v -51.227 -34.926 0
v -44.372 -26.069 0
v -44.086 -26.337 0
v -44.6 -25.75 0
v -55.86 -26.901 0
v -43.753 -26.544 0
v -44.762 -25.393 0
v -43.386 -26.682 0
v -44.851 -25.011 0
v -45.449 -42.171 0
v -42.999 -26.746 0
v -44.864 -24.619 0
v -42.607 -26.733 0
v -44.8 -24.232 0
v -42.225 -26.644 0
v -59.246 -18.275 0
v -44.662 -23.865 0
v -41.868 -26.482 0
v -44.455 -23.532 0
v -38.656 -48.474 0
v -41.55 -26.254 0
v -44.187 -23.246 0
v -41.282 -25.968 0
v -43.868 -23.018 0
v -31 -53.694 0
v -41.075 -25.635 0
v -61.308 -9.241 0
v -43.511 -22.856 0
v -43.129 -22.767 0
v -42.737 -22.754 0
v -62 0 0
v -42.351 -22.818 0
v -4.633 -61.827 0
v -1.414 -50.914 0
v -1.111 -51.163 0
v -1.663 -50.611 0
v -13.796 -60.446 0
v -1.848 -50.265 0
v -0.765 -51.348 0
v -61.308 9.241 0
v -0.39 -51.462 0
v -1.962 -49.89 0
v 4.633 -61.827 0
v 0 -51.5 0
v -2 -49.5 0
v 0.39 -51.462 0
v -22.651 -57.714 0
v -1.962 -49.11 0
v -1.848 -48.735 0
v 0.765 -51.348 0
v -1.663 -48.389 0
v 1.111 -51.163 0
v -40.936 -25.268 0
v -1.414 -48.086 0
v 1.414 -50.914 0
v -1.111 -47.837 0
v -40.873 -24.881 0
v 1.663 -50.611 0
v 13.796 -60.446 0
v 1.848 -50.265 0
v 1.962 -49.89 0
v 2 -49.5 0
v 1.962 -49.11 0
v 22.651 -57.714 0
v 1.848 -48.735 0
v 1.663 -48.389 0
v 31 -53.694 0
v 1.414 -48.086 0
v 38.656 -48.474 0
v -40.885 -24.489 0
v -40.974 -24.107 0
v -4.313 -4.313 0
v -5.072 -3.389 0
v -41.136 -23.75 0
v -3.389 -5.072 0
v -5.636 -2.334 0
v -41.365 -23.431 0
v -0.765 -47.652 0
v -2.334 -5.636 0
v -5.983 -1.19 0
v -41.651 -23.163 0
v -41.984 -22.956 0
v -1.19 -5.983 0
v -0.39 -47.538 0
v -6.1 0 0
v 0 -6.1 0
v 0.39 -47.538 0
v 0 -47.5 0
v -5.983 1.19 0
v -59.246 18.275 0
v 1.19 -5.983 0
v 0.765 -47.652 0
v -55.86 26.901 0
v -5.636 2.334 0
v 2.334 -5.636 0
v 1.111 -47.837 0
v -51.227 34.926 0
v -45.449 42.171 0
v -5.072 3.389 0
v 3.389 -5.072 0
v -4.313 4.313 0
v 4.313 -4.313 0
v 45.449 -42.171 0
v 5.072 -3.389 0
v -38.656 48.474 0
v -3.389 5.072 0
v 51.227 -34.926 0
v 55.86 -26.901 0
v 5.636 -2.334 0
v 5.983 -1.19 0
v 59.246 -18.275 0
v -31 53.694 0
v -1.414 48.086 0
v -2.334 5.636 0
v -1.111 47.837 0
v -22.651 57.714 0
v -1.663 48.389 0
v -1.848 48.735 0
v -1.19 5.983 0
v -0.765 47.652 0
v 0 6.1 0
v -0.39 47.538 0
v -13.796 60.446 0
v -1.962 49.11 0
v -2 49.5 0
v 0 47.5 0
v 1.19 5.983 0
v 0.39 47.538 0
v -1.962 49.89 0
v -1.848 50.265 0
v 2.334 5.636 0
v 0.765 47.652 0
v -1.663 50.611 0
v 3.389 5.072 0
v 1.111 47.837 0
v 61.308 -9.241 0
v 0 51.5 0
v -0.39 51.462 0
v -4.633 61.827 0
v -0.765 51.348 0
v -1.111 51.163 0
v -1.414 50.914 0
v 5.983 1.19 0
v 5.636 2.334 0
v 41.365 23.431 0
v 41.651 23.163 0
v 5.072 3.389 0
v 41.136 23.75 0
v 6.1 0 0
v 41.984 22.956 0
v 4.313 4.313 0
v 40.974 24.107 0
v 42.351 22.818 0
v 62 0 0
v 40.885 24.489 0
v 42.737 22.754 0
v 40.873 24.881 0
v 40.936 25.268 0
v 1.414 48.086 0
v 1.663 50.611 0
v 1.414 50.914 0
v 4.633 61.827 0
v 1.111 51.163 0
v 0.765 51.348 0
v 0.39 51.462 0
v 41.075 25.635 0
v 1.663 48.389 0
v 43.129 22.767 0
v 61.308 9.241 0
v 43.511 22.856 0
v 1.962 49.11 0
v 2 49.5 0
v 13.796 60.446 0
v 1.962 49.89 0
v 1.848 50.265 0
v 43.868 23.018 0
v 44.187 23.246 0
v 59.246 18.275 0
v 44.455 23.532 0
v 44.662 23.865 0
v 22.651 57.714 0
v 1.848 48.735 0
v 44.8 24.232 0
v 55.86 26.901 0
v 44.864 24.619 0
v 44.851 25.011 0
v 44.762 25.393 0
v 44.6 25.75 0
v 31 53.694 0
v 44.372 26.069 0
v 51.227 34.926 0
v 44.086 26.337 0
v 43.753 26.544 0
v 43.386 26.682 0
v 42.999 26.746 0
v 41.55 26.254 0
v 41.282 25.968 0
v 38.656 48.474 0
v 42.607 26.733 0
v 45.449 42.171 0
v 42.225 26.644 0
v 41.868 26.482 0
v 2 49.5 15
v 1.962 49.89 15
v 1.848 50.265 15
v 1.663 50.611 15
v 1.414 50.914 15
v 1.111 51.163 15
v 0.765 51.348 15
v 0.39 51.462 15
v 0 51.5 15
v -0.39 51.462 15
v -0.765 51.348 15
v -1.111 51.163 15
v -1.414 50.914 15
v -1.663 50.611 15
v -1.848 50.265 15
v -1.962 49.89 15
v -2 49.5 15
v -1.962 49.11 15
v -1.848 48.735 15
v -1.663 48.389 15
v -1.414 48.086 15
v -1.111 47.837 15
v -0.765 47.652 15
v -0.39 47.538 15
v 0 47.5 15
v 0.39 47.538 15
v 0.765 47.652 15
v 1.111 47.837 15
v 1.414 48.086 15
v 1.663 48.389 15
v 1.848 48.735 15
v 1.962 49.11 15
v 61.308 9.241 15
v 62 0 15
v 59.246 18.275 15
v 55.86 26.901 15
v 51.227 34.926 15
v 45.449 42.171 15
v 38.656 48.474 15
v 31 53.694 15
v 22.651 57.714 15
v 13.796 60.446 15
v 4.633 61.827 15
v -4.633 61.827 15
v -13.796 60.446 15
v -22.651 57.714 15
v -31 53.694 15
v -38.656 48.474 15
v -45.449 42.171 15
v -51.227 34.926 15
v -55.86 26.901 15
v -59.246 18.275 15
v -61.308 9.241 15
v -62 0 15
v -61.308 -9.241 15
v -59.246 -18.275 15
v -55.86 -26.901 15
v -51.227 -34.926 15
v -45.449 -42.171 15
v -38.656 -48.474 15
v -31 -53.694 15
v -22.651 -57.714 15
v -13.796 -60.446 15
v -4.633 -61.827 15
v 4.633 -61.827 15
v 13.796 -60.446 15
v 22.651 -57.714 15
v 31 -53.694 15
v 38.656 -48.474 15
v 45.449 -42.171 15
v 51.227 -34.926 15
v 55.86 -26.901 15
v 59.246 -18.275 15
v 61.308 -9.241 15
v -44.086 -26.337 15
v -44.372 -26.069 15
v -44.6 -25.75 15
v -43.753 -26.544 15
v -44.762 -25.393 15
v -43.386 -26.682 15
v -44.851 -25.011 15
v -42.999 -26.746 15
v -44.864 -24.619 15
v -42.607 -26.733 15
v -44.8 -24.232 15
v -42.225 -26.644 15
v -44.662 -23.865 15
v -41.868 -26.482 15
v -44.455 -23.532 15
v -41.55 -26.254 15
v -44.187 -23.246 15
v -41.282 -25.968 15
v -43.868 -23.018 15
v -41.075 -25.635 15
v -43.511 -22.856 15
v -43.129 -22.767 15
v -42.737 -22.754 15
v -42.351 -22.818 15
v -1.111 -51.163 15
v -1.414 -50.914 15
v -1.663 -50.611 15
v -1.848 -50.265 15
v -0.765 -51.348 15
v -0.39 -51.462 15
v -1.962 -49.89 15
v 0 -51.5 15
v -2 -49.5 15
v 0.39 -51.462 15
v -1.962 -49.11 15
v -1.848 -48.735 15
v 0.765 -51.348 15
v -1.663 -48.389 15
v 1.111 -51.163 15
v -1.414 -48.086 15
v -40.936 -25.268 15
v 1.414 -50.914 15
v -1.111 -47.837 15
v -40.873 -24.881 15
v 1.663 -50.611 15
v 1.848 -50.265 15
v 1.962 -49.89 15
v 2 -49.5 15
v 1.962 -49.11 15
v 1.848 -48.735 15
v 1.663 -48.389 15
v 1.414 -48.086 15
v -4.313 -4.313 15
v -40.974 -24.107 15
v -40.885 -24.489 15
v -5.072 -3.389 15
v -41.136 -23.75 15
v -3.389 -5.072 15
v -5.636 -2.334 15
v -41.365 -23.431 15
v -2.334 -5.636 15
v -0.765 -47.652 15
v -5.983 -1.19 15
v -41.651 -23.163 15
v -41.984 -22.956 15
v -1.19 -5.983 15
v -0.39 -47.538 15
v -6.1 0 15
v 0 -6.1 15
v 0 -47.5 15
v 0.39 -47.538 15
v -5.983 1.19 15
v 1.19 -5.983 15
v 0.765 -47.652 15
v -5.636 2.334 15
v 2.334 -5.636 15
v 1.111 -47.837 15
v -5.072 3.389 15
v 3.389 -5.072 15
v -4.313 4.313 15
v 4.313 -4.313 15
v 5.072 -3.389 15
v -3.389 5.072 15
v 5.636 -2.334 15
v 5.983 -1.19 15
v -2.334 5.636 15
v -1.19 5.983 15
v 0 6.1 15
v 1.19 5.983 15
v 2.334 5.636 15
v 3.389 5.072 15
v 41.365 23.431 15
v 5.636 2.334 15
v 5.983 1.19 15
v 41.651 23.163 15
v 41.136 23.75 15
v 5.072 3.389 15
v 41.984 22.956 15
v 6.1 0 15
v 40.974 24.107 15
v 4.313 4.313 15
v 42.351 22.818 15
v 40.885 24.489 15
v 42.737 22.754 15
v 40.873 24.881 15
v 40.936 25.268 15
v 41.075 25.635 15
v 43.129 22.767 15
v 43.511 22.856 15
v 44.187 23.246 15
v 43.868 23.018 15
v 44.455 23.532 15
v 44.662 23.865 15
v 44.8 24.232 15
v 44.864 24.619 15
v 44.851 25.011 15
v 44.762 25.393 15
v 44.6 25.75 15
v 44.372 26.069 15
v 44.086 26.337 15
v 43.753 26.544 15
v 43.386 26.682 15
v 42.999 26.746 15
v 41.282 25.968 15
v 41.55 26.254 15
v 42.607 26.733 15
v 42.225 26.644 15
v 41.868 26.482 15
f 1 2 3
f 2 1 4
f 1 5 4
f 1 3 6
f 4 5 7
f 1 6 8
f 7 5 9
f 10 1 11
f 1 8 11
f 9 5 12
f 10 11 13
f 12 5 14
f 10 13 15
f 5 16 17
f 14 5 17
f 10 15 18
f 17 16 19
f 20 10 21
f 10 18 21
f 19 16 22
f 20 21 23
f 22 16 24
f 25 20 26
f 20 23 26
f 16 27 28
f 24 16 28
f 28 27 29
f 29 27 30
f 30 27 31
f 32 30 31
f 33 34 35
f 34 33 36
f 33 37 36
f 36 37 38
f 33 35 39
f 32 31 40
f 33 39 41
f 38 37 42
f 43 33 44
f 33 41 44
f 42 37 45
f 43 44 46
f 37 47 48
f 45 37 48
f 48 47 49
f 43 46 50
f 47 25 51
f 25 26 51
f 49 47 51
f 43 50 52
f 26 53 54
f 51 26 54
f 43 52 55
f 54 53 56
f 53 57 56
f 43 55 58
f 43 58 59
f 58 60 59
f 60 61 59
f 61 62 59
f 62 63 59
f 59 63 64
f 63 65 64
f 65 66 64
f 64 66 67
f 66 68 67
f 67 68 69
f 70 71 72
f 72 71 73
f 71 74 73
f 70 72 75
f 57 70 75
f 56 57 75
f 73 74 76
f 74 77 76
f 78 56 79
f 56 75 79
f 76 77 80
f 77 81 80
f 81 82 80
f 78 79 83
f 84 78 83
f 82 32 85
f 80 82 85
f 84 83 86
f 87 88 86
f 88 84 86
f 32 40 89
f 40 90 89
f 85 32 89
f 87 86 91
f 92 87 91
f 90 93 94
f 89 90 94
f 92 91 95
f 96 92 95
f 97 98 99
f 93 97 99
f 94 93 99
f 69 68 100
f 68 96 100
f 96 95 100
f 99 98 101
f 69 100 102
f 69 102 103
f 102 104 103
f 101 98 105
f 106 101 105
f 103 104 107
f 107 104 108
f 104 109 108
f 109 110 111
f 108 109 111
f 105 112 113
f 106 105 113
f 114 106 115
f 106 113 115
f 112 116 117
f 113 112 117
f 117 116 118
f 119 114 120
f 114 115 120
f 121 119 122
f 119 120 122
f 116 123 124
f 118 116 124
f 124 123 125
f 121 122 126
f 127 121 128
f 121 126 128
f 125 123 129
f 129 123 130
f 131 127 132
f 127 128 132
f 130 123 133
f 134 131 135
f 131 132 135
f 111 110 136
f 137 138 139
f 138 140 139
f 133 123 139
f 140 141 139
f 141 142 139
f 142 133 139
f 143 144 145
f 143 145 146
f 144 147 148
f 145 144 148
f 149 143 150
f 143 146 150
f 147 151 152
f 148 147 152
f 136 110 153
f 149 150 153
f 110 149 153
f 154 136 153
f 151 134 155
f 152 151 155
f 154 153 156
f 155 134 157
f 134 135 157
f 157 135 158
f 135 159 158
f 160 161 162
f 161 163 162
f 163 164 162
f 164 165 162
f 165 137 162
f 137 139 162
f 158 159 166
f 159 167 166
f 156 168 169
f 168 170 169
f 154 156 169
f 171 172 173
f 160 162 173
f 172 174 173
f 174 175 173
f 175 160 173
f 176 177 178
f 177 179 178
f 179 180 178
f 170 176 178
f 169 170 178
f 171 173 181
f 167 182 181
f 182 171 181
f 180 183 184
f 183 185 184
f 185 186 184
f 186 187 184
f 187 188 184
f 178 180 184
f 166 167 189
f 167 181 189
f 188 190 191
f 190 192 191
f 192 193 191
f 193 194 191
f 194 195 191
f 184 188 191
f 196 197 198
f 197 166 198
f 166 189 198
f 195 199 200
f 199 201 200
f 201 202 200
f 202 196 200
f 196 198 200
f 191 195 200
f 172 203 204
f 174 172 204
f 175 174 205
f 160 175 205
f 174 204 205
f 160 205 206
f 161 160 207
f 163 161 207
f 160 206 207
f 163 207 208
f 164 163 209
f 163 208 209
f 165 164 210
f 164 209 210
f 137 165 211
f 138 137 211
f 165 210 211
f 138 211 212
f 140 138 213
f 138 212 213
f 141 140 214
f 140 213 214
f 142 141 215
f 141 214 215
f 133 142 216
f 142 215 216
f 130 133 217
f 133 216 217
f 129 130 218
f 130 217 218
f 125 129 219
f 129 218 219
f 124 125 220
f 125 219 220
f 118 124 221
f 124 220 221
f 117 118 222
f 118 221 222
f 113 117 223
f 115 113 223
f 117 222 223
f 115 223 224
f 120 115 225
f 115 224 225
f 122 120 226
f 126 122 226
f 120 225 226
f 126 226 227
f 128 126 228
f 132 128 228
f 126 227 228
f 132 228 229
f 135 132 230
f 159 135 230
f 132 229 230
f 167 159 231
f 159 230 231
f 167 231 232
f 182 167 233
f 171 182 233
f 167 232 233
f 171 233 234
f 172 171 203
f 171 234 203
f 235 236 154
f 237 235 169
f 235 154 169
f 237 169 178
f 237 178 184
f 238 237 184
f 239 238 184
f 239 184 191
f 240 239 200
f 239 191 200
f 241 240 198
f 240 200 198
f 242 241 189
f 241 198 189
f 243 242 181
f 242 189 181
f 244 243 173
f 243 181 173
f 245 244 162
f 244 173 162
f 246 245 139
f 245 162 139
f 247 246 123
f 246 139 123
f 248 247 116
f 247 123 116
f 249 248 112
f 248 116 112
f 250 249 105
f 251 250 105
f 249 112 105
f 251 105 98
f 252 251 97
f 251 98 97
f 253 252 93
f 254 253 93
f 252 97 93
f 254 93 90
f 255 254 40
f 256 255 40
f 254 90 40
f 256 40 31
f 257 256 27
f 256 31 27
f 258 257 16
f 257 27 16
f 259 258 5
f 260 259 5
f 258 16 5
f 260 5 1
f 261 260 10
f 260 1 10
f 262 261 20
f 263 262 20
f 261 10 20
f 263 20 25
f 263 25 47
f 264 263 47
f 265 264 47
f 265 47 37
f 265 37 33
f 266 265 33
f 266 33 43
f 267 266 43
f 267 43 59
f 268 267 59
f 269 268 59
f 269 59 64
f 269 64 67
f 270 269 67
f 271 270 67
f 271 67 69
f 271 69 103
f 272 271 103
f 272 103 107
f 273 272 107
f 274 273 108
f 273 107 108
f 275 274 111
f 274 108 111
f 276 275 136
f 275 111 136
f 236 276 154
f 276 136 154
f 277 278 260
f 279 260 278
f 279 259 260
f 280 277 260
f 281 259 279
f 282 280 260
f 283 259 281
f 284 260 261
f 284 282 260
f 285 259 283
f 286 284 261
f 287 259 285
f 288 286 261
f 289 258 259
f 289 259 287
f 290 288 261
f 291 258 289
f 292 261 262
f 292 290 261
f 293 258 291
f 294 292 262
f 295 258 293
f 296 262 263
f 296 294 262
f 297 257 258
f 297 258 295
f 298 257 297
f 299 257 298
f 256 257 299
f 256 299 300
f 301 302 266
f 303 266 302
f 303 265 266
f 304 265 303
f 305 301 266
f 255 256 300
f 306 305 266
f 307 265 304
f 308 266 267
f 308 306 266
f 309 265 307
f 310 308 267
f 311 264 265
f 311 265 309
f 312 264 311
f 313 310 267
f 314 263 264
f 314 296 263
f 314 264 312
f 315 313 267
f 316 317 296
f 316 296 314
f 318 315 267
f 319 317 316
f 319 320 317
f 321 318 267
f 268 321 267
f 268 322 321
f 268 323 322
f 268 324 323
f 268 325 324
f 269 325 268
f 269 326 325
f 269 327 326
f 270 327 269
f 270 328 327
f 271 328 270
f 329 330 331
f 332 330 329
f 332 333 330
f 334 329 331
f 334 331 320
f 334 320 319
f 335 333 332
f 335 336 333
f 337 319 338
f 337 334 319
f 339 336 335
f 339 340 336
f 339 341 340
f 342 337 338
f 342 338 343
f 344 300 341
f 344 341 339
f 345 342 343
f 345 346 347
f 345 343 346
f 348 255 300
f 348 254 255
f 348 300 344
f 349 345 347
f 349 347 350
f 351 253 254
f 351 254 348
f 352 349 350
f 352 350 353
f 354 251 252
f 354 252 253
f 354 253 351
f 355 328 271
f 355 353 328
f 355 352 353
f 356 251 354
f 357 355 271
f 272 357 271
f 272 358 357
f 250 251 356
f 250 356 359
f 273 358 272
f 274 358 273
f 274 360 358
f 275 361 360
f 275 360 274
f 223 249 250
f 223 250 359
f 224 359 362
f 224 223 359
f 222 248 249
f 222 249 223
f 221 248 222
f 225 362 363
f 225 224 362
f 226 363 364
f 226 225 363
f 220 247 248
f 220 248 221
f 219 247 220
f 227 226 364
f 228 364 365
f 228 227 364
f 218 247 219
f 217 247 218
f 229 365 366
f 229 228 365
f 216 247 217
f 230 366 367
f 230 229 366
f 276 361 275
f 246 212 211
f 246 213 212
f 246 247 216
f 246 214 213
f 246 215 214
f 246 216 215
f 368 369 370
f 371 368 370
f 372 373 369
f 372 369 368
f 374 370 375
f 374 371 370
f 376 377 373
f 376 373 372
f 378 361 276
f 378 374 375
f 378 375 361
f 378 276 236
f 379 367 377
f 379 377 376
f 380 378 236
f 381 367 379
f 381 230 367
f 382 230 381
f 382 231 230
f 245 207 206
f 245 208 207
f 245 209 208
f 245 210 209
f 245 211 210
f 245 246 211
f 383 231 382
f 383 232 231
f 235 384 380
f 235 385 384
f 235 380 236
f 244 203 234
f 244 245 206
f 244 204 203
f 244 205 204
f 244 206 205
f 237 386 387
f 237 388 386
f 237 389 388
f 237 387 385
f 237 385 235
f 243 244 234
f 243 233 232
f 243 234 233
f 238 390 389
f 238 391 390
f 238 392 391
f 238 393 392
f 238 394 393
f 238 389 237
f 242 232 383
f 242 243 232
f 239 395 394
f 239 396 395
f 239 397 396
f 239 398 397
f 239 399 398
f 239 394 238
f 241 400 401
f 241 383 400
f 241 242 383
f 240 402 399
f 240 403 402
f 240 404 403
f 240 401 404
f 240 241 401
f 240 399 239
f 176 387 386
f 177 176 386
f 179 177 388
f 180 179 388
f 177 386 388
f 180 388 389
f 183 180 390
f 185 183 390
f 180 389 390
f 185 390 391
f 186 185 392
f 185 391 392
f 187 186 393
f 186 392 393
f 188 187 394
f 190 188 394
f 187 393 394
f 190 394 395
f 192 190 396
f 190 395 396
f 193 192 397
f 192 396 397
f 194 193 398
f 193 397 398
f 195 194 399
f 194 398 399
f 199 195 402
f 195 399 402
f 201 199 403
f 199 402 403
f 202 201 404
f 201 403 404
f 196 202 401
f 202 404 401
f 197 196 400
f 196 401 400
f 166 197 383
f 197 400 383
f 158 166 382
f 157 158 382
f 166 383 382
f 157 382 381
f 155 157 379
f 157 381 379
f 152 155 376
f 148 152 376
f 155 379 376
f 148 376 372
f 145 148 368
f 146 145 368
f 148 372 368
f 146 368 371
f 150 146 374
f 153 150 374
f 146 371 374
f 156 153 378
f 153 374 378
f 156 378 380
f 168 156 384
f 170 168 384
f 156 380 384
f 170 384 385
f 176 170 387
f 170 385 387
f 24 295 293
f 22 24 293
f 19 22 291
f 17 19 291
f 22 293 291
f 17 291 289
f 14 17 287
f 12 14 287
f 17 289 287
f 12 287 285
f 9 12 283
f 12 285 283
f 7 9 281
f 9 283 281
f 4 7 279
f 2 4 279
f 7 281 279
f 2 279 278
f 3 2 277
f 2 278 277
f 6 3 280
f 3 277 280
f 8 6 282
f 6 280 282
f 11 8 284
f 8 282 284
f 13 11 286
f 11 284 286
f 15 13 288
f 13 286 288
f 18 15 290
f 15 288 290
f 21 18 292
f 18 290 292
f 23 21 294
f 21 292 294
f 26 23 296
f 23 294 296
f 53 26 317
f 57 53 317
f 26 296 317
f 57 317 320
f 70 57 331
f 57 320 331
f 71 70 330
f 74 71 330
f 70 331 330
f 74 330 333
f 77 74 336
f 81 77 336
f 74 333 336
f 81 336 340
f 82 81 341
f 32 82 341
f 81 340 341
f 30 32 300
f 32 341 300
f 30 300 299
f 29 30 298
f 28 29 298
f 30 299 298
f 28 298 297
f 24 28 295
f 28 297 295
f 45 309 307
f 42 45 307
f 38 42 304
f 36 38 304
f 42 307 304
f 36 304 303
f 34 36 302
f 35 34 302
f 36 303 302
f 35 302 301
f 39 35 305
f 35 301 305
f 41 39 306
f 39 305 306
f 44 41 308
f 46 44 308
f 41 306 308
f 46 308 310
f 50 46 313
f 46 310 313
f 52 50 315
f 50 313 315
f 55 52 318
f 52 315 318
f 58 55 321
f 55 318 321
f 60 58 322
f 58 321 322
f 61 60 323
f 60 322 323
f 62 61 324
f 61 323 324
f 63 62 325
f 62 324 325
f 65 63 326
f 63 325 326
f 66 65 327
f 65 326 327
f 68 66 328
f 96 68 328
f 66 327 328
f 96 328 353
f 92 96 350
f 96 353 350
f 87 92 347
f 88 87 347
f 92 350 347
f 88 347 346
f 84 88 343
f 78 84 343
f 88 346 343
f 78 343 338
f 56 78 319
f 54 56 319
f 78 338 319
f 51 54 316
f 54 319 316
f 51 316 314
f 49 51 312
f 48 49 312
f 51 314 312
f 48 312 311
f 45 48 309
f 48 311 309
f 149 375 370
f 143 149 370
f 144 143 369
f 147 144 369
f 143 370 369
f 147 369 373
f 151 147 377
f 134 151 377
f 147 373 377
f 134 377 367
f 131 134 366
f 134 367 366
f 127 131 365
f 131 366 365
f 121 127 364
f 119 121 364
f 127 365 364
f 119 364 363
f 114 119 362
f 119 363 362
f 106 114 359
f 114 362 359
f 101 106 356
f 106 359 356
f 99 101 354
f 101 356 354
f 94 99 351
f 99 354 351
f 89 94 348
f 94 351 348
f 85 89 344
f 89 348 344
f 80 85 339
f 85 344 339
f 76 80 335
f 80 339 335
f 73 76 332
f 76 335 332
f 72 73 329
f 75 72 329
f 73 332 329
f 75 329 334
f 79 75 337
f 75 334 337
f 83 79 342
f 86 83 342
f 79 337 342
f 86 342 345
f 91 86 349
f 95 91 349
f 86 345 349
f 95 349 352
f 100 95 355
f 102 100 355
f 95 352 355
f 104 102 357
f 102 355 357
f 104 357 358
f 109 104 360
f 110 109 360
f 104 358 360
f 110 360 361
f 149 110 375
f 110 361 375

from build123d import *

# Parameters (mm, degrees)
SKETCH1_R                   = 62
BOSS_EXTRUDE1_DEPTH         = 15
SKETCH2_R                   = 2
CUT_EXTRUDE1_DEPTH          = 15
CIRPATTERN1_COUNT           = 2
CIRPATTERN1_ANGLE           = 60
CIRPATTERN2_COUNT           = 2
CIRPATTERN2_COPY_1_SKETCH_R = 2
CIRPATTERN2_COPY_1_DEPTH    = 15
SKETCH3_R                   = 6.1
CUT_EXTRUDE2_DEPTH          = 15


with BuildPart() as part:
    # Sketch1 → Boss-Extrude1 (new body)
    with BuildSketch(Plane.XY):
        Circle(SKETCH1_R)
    extrude(amount=BOSS_EXTRUDE1_DEPTH)

    # Sketch2 → Cut-Extrude1 (cut)
    with BuildSketch(Plane.XY.offset(15)):
        with Locations((0, 49.5)):
            Circle(SKETCH2_R)
    cut_extrude1 = extrude(amount=-CUT_EXTRUDE1_DEPTH, mode=Mode.SUBTRACT)

    # CirPattern1: Cut-Extrude1 ×2 about axis
    cirpattern1_axis = Axis((0, 0, 15), (0, 0, -1))
    for i in range(1, CIRPATTERN1_COUNT):
        add(cut_extrude1.rotate(cirpattern1_axis, i * CIRPATTERN1_ANGLE / (CIRPATTERN1_COUNT - 1)), mode=Mode.SUBTRACT)

    # CirPattern2: Cut-Extrude1 ×2 about axis
    cirpattern2_axis = Axis((0, 0, 15), (0, 0, -1))
    for i in range(1, CIRPATTERN2_COUNT):
        add(cut_extrude1.rotate(cirpattern2_axis, i * 360 / CIRPATTERN2_COUNT), mode=Mode.SUBTRACT)

    # CirPattern2 copy 1 sketch → CirPattern2 copy 1 (cut)
    with BuildSketch(Plane(origin=(0, 0, 15), x_dir=(-0.4999999999999979, 0.8660254037844398, 0), z_dir=(0, 0, 1))):
        with Locations((0, 49.5)):
            Circle(CIRPATTERN2_COPY_1_SKETCH_R)
    extrude(amount=-CIRPATTERN2_COPY_1_DEPTH, mode=Mode.SUBTRACT)

    # Sketch3 → Cut-Extrude2 (cut)
    with BuildSketch(Plane.XY.offset(15)):
        Circle(SKETCH3_R)
    extrude(amount=-CUT_EXTRUDE2_DEPTH, mode=Mode.SUBTRACT)


solid = part.part
